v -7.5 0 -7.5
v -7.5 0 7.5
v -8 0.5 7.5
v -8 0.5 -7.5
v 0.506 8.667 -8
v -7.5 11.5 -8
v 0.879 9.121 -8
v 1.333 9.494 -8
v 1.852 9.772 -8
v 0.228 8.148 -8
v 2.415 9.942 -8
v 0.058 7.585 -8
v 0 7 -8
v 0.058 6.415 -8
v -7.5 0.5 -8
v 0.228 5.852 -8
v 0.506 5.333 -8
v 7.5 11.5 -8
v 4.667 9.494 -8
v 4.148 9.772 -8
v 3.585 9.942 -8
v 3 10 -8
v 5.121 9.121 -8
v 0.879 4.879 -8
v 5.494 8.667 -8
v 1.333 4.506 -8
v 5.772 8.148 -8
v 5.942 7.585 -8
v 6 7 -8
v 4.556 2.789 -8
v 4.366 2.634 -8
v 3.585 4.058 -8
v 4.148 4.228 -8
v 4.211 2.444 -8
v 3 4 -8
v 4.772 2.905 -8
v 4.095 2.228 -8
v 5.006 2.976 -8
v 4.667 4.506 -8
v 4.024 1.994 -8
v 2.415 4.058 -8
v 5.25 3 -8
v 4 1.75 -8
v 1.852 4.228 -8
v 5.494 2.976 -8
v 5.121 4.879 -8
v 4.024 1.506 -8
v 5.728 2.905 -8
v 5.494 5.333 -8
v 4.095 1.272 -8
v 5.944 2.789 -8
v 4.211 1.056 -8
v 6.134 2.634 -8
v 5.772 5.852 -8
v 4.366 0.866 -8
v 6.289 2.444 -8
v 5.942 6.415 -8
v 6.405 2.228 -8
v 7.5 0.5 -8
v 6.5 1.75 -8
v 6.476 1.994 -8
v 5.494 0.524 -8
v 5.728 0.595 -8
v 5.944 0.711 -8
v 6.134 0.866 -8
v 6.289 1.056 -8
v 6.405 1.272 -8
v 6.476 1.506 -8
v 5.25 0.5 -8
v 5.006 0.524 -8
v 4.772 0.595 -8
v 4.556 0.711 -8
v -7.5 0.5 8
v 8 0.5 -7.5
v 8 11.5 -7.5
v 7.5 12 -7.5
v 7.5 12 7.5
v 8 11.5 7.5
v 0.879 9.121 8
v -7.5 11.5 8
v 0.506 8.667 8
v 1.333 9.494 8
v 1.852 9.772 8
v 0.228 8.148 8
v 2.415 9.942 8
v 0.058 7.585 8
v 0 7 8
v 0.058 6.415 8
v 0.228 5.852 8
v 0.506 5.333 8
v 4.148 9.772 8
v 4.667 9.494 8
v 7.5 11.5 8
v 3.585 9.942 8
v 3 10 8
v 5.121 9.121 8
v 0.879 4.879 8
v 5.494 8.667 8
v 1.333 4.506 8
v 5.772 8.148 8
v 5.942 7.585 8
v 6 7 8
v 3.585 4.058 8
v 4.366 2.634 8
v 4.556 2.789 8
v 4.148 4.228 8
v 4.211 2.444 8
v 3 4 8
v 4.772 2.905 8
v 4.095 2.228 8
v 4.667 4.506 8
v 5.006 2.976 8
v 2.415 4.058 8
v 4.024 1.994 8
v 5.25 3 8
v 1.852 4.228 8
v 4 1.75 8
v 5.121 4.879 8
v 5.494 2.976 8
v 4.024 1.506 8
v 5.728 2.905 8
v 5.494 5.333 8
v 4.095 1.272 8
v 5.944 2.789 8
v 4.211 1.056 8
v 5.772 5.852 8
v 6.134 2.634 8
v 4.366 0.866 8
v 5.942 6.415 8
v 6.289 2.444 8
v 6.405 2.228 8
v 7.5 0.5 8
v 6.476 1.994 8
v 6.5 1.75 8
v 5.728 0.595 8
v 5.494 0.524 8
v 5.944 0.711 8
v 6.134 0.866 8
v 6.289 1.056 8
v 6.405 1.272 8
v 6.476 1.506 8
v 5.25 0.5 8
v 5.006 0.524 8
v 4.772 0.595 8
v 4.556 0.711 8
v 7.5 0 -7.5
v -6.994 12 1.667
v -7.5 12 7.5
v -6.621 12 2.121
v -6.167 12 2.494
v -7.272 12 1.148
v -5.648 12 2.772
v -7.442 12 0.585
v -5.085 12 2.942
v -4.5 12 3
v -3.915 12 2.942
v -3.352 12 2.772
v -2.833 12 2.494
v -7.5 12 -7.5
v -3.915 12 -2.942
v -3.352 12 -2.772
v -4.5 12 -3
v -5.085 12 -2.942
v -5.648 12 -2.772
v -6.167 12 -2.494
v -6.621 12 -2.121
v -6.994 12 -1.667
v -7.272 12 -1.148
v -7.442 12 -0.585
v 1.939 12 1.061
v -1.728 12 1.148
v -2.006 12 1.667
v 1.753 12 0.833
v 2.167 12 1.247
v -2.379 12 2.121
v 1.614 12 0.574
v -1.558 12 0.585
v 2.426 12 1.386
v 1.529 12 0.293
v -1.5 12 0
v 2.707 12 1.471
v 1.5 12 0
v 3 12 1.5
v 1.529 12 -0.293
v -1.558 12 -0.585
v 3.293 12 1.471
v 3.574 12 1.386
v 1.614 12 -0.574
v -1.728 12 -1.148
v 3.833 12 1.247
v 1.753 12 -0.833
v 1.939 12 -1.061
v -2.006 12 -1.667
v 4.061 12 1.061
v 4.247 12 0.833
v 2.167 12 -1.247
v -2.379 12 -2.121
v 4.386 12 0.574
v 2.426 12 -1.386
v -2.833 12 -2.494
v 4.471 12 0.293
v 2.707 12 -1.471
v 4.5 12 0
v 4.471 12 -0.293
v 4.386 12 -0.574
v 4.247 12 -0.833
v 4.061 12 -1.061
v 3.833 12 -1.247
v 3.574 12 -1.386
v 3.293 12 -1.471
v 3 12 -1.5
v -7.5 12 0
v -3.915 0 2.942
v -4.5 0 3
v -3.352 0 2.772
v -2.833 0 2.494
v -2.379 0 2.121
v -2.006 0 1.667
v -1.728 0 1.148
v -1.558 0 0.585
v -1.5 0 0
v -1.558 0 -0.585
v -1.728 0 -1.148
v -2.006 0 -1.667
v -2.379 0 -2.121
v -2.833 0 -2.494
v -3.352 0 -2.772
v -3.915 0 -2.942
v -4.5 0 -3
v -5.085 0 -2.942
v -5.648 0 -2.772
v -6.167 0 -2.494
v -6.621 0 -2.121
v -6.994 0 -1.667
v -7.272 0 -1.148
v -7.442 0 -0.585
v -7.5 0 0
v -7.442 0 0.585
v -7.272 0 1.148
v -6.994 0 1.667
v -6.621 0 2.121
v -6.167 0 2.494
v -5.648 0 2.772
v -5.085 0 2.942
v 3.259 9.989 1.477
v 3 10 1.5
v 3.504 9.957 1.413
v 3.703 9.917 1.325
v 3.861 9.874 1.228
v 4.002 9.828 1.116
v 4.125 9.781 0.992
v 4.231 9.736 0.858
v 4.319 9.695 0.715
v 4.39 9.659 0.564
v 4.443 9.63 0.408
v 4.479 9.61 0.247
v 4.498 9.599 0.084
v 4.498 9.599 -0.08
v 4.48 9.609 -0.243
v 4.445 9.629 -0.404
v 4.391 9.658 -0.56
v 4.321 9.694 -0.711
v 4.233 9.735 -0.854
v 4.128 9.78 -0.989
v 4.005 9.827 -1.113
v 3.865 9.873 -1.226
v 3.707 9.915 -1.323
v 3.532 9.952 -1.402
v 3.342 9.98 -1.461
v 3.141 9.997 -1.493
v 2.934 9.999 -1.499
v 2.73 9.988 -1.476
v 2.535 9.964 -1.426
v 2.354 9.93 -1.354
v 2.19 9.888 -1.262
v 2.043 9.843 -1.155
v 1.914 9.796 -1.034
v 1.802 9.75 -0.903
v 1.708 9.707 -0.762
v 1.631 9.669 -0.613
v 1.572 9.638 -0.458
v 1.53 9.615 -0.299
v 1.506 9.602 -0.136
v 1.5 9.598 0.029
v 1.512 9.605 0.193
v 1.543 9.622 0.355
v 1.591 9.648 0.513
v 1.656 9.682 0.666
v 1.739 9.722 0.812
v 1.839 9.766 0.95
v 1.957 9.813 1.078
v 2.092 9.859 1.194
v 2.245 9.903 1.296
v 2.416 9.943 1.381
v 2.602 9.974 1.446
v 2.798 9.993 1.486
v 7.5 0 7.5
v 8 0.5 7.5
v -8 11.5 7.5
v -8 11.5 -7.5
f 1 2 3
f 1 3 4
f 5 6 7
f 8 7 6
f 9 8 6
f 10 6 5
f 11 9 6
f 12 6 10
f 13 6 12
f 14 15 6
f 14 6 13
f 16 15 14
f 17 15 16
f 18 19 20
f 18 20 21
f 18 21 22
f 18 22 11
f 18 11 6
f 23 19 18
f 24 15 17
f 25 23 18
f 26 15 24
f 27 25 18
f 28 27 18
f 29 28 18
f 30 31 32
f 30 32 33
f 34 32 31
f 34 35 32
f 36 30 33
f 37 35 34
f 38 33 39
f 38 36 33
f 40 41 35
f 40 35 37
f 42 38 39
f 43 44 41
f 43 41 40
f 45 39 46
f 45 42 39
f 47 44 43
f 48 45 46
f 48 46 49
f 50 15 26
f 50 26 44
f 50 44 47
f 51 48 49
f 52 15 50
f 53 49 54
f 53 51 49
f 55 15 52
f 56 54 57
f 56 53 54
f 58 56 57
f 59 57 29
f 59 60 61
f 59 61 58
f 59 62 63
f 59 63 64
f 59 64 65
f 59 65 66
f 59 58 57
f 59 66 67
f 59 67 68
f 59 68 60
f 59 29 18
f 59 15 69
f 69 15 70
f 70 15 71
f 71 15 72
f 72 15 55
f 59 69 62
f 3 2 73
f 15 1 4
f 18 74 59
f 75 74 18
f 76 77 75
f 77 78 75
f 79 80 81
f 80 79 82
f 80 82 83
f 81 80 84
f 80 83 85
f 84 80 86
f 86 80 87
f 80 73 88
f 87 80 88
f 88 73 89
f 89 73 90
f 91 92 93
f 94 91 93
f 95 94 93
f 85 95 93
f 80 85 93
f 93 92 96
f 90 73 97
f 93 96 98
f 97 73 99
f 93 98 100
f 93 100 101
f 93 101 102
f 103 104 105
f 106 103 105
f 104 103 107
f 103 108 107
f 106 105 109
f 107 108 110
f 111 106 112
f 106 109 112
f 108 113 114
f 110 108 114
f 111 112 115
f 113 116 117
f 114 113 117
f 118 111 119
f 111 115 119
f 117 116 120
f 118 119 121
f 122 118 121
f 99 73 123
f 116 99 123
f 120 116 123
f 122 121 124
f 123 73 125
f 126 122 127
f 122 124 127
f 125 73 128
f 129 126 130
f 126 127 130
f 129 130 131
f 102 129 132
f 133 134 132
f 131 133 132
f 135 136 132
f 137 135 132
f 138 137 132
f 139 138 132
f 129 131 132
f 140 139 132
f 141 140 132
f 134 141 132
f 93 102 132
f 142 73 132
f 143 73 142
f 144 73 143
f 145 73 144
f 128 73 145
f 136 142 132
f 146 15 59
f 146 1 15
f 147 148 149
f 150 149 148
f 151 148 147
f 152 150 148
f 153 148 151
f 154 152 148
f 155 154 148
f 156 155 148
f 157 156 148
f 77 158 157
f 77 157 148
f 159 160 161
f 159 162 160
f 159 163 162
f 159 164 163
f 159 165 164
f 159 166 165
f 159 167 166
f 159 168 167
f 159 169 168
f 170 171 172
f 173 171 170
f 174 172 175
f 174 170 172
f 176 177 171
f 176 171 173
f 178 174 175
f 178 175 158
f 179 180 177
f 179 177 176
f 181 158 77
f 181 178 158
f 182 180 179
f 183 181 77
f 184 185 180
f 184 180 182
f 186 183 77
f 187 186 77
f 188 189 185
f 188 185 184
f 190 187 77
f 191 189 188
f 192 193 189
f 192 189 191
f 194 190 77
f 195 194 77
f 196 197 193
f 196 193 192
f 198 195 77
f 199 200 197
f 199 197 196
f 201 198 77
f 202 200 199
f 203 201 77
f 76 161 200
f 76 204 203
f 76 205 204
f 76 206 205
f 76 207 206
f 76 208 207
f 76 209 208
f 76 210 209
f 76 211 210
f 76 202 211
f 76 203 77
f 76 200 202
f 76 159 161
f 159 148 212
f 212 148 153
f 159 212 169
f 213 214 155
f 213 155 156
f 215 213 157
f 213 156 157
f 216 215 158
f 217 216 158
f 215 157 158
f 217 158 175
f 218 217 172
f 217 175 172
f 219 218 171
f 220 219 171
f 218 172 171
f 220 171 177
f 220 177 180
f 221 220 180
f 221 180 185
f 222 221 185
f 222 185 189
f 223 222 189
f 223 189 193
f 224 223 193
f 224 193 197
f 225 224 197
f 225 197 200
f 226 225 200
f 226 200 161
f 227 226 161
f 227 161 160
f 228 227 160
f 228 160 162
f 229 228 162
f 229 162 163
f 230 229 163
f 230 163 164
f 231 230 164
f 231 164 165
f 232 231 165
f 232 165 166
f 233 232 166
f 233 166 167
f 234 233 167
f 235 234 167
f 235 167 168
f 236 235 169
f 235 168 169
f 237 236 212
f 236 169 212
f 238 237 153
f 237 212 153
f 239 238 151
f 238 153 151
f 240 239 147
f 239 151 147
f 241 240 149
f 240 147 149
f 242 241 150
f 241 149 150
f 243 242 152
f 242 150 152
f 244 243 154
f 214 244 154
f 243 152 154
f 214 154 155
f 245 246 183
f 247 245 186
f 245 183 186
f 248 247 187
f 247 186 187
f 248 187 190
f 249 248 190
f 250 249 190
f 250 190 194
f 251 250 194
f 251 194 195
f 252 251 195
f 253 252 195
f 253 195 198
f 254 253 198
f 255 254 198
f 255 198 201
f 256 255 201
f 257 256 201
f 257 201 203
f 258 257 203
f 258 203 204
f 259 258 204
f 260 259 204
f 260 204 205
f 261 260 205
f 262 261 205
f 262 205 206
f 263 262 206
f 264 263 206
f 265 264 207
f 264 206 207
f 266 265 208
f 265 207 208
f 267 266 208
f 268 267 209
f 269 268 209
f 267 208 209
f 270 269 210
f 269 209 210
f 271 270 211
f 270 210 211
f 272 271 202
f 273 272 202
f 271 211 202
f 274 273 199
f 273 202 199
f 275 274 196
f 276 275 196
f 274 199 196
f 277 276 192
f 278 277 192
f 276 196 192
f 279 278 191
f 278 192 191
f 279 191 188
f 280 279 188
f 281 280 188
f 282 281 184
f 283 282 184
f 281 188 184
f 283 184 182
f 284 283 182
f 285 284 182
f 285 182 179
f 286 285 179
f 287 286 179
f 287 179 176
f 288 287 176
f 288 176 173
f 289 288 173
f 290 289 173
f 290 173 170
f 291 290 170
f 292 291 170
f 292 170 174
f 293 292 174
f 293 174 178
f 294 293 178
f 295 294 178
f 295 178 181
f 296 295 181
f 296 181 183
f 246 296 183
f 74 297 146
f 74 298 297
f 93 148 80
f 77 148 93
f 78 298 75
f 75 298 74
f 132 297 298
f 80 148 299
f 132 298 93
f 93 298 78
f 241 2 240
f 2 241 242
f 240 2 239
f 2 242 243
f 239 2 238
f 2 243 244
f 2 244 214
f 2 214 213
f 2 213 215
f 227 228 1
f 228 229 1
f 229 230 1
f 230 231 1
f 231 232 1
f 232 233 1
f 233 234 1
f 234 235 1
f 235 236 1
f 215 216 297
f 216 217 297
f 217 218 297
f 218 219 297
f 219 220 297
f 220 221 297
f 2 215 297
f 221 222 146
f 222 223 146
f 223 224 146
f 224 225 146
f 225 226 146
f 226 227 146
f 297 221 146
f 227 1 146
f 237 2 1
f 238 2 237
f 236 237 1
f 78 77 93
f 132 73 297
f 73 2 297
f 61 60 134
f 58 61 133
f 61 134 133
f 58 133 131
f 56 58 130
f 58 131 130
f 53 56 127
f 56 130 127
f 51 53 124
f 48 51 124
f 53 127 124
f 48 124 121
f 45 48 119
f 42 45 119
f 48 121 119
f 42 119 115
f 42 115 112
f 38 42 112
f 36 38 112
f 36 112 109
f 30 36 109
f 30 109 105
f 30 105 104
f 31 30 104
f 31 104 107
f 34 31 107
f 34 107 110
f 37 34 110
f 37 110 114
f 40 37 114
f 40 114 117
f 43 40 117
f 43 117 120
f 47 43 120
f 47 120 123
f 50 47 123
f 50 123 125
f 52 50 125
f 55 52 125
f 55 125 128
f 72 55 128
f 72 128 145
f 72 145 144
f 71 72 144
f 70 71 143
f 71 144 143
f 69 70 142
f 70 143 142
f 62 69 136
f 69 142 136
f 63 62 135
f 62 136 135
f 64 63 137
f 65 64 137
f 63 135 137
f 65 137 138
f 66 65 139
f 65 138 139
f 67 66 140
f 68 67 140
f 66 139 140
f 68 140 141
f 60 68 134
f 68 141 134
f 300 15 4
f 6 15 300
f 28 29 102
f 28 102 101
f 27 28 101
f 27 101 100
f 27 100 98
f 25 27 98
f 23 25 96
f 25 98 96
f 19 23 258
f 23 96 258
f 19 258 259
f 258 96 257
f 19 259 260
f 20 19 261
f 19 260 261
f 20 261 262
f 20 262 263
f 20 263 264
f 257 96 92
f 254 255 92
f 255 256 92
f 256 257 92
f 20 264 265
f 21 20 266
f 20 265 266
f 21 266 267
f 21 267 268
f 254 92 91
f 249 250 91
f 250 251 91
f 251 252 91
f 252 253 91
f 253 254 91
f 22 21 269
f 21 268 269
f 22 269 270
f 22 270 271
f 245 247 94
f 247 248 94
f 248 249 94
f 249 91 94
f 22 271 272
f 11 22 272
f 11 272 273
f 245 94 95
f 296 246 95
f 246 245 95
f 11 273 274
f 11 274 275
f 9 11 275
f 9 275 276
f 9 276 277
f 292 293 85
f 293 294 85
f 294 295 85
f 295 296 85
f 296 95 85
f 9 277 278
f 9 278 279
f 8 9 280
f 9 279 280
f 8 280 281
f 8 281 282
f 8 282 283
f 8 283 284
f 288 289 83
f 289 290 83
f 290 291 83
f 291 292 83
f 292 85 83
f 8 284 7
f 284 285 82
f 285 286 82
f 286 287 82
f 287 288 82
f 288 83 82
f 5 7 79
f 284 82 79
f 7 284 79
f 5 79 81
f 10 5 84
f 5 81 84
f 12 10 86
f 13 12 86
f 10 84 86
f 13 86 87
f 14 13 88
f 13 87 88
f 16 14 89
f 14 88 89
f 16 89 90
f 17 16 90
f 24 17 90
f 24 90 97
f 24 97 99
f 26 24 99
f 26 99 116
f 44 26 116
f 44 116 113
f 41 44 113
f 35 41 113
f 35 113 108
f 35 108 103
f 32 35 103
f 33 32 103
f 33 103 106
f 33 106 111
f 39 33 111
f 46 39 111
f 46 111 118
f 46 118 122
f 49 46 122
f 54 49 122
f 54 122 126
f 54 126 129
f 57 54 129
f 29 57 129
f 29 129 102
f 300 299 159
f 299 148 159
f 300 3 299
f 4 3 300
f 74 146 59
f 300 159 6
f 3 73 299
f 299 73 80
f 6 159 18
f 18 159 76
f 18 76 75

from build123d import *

# Parameters (mm, degrees)
SKETCH_1_W               = 16
SKETCH_1_H               = 16
EXTRUDE_1_DEPTH          = 12
SKETCH_2_R               = 3
CUT_EXTRUDE_2_DEPTH      = 17.492422502
SKETCH_3_R               = 1.25
CUT_EXTRUDE_3_DEPTH      = 22.540659229
SKETCH_4_R               = 3
CUT_EXTRUDE_4_DEPTH      = 22.540659229
CHAMFER_1_SIZE           = 0.5
CUT_EXTRUDE_5_REACH      = 18.492
CUT_EXTRUDE_5_END_RADIUS = 3
SKETCH_5_R               = 1.5


with BuildPart() as part:
    # 草圖1 → 填料-伸長1 (new body)
    with BuildSketch(Plane(origin=(0, 0, 0), x_dir=(1, 0, 0), z_dir=(0, 1, 0))):
        Rectangle(SKETCH_1_W, SKETCH_1_H)
    extrude(amount=EXTRUDE_1_DEPTH)

    # 草圖2 → 除料-伸長2 (cut, through all)
    with BuildSketch(Plane(origin=(0, 12, 0), x_dir=(1, 0, 0), z_dir=(0, 1, 0))):
        with Locations(Location((-4.5, 0, 0), (0, 0, 270))):
            Circle(SKETCH_2_R)
    extrude(amount=-CUT_EXTRUDE_2_DEPTH, mode=Mode.SUBTRACT)

    # 草圖3 → 除料-伸長3 (cut, through all)
    with BuildSketch(Plane.XY.offset(8)):
        with Locations((5.25, 1.75)):
            Circle(SKETCH_3_R)
    extrude(amount=-CUT_EXTRUDE_3_DEPTH, mode=Mode.SUBTRACT)

    # 草圖4 → 除料-伸長4 (cut, through all)
    with BuildSketch(Plane.XY.offset(8)):
        with Locations((3, 7)):
            Circle(SKETCH_4_R)
    extrude(amount=-CUT_EXTRUDE_4_DEPTH, mode=Mode.SUBTRACT)

    # 導角1
    chamfer_1_edges = [part.edges().sort_by_distance(p)[0] for p in [
        (8, 12, 0),
        (0, 12, -8),
        (-8, 12, 0),
        (0, 0, -8),
        (8, 0, 0),
        (0, 0, 8),
        (-8, 0, 0),
        (0, 12, 8),
        (-8, 6, -8),
        (8, 6, -8),
        (8, 6, 8),
        (-8, 6, 8),
    ]]
    chamfer(chamfer_1_edges, length=CHAMFER_1_SIZE - 0.0001)  # a hair under: the kernel refuses the full size

    # 除料-伸長5: up to this cylinder (the profile starts outside it)
    cut_extrude_5_end = Plane(origin=(3, 7, 0), z_dir=(0, 0, 1)) * Cylinder(CUT_EXTRUDE_5_END_RADIUS, 43.984, mode=Mode.PRIVATE)
    # 草圖5 → 除料-伸長5 (cut, up to the surface)
    with BuildSketch(Plane(origin=(0, 12, 0), x_dir=(1, 0, 0), z_dir=(0, 1, 0)), mode=Mode.PRIVATE) as cut_extrude_5_sk1:
        with Locations(Location((3, 0, 0), (0, 0, 270))):
            Circle(SKETCH_5_R)
    cut_extrude_5_tool1 = extrude(cut_extrude_5_sk1.sketch, amount=-CUT_EXTRUDE_5_REACH, mode=Mode.PRIVATE) - cut_extrude_5_end
    add(cut_extrude_5_tool1.solids().sort_by_distance((3, 12, 0))[0], mode=Mode.SUBTRACT)


solid = part.part
